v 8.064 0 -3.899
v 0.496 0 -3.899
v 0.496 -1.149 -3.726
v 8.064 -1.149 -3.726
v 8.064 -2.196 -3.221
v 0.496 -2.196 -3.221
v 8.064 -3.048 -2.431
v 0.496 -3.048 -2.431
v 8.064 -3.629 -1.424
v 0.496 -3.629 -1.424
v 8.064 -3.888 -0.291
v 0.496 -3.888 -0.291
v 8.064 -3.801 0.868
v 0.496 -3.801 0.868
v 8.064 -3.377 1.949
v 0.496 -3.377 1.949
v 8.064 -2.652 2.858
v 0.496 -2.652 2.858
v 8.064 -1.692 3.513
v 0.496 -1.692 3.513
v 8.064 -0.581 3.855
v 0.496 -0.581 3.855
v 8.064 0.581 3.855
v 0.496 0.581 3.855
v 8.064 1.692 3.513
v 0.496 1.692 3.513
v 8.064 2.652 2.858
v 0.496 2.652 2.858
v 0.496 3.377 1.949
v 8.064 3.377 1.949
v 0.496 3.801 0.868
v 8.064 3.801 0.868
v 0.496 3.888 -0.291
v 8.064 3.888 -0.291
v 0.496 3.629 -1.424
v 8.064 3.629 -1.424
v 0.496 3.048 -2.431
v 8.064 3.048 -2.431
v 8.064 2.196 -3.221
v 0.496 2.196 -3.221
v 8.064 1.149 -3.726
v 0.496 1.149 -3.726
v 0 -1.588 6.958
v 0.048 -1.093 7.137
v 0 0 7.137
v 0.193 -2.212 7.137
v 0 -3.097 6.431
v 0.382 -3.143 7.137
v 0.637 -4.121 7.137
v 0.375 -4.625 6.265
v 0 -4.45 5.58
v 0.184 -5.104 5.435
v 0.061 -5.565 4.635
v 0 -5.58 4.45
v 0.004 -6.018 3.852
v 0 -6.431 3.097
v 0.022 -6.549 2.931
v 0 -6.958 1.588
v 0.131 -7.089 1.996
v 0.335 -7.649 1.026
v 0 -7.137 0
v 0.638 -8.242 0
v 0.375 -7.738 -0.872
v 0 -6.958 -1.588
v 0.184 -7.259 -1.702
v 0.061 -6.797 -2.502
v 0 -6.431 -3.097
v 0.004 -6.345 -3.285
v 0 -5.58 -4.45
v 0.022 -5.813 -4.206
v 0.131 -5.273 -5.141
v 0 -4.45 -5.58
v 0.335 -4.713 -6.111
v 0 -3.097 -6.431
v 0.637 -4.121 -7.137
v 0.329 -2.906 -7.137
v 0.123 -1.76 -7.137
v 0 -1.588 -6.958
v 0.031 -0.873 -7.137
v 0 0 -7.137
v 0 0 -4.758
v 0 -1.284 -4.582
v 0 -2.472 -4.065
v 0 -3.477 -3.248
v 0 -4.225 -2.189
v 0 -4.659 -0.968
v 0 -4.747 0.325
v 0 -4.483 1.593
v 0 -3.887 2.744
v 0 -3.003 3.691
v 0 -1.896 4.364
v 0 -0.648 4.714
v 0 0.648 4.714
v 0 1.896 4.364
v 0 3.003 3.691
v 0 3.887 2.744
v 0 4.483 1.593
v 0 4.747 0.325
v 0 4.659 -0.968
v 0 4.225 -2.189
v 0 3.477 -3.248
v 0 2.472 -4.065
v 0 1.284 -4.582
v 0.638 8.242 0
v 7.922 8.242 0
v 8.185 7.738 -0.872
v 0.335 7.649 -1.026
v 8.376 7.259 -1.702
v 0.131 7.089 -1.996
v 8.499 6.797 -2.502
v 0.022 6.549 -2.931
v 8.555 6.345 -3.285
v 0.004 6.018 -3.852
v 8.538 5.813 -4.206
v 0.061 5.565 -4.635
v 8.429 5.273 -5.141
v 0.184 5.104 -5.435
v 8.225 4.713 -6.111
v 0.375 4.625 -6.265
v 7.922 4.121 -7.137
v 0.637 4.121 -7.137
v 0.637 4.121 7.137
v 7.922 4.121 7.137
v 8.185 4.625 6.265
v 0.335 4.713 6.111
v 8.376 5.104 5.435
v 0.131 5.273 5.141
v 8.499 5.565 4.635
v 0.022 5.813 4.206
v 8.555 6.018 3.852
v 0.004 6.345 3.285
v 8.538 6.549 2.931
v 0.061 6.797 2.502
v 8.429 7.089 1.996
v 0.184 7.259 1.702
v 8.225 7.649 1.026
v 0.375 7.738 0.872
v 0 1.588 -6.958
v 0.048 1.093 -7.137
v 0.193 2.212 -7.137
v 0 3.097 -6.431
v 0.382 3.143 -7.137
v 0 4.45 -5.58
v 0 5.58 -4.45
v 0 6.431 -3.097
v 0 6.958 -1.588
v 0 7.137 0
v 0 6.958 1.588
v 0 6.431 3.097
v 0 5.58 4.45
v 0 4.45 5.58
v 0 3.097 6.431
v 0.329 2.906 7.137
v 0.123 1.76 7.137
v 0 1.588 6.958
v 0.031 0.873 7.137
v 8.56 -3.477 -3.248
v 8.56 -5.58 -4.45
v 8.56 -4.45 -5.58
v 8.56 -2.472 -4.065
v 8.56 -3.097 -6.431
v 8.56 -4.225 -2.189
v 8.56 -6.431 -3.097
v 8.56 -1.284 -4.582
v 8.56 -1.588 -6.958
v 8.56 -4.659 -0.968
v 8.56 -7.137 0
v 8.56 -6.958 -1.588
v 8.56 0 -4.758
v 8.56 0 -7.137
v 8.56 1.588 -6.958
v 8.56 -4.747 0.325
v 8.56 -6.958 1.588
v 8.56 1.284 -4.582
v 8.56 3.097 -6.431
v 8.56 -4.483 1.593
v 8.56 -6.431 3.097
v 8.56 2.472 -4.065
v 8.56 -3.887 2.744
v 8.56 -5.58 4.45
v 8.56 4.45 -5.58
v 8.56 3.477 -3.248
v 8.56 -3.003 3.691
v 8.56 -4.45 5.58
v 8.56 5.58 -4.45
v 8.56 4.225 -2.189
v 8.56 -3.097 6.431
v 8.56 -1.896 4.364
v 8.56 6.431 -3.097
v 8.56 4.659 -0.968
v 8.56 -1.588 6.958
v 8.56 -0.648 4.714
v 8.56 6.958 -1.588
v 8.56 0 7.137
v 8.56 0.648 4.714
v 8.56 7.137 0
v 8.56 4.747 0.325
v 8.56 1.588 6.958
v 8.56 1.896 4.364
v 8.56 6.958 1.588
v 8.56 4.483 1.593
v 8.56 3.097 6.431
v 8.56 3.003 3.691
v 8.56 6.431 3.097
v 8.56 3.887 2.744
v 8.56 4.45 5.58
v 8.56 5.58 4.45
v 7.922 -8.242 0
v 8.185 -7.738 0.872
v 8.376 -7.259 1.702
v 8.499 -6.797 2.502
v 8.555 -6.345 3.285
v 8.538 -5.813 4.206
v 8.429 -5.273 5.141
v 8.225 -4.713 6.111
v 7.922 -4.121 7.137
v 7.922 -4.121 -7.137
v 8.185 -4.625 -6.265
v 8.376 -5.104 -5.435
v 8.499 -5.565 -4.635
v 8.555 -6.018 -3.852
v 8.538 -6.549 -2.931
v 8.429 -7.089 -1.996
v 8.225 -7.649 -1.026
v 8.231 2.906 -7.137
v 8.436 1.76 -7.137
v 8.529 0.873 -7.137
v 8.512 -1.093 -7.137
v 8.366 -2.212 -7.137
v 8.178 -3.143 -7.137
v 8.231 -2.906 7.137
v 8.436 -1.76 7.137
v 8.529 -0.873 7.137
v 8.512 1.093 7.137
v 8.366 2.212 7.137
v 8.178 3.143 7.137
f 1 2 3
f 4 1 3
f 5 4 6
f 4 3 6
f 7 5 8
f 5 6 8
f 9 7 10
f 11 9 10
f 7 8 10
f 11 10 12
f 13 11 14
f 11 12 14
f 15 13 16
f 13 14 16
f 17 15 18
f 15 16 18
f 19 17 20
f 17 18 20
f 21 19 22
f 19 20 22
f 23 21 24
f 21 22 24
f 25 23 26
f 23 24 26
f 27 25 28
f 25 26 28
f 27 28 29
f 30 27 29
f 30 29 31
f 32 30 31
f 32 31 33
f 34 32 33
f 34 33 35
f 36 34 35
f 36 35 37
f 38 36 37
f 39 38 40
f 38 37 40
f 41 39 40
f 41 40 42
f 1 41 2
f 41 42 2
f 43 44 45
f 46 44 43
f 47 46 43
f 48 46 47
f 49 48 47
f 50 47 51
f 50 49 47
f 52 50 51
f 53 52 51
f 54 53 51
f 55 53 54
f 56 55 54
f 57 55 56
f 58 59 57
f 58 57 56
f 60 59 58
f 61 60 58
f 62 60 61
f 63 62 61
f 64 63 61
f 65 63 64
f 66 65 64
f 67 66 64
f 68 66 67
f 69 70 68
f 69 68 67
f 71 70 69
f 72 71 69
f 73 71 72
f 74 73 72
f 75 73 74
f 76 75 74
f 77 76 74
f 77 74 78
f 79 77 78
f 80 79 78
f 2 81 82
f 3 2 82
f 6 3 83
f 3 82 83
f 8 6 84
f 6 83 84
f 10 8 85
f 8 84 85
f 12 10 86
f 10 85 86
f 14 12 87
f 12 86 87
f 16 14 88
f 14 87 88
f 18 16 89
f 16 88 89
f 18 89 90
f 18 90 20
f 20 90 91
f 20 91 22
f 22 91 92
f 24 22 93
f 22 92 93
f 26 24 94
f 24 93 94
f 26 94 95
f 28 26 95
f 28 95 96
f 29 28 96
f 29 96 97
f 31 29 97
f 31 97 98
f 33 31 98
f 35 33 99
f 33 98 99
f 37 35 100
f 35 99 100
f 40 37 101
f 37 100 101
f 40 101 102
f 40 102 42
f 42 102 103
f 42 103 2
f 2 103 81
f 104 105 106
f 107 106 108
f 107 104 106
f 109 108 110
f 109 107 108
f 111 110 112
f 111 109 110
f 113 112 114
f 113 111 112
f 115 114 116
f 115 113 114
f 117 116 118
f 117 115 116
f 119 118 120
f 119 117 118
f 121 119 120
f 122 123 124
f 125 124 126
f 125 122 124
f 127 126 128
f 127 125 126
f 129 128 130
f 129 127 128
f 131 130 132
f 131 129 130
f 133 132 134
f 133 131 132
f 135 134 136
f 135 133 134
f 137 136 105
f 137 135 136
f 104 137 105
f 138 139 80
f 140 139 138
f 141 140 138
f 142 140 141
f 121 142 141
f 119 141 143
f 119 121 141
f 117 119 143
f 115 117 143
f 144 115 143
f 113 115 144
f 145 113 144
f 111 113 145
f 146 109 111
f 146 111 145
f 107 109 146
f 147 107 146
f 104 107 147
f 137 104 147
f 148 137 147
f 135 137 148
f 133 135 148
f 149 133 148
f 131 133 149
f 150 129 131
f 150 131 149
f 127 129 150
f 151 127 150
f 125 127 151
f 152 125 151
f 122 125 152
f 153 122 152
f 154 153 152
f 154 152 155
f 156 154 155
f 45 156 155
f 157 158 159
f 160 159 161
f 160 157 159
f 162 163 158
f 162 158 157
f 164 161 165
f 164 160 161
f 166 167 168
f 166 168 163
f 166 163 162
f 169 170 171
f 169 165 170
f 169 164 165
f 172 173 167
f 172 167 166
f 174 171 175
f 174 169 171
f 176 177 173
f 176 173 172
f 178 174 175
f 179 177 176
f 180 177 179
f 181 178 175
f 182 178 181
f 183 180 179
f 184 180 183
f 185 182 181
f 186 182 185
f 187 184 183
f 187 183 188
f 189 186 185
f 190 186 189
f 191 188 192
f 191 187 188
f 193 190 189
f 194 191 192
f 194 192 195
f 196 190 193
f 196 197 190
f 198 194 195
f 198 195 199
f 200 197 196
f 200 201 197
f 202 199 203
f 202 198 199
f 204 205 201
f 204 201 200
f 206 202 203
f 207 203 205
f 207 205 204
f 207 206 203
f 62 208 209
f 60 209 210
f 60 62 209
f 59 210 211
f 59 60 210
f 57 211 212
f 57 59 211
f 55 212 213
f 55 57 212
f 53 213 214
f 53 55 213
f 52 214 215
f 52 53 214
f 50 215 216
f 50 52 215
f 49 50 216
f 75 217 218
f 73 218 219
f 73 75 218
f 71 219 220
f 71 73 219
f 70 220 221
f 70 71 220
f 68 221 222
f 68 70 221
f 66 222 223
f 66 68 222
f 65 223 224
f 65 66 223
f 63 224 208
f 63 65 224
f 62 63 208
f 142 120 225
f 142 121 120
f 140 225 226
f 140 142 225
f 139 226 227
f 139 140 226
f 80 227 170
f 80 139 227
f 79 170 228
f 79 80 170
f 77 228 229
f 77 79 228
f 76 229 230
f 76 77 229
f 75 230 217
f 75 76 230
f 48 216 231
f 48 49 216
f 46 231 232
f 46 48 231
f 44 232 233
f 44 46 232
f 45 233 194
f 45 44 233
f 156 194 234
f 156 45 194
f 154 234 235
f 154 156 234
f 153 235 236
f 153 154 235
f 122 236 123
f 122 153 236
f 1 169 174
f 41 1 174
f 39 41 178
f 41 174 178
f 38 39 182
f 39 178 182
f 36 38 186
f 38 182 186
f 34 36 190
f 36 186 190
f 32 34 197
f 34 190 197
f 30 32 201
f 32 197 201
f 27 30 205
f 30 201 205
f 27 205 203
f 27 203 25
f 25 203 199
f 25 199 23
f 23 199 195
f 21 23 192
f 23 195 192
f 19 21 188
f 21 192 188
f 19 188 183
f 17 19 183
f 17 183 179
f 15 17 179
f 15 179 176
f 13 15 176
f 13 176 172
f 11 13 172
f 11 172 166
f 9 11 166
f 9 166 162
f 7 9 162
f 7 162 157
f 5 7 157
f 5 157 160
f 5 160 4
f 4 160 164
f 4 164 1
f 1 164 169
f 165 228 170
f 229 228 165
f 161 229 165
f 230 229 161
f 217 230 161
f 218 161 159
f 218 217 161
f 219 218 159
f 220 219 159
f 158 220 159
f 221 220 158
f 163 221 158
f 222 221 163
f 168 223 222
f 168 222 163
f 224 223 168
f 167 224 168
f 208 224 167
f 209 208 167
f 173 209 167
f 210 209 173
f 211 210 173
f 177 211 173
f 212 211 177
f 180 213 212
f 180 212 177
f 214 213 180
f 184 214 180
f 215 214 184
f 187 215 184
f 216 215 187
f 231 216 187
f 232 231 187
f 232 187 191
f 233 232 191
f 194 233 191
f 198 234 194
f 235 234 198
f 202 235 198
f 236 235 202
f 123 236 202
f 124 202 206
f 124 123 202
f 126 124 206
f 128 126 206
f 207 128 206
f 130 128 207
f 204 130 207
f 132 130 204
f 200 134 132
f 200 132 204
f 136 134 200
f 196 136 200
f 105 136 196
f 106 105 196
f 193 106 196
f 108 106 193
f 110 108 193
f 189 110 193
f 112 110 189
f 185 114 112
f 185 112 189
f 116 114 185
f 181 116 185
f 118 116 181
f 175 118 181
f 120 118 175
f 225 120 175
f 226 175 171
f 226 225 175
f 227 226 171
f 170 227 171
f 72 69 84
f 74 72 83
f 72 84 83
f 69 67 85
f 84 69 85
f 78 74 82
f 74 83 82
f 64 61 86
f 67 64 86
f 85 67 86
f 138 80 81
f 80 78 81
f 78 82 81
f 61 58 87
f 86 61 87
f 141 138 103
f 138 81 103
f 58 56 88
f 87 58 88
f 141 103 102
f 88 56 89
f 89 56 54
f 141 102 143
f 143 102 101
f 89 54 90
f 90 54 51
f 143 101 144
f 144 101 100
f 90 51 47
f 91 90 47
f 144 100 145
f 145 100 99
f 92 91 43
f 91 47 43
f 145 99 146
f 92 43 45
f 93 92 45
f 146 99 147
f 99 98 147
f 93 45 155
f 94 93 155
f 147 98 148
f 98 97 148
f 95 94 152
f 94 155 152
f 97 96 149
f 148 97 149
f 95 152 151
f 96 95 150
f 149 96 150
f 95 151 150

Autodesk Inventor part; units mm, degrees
ref_plane "YZ Plane" through (0, 0, 0) normal (1, 0, 0) x (0, 1, 0)
ref_plane "XZ Plane" through (0, 0, 0) normal (0, 1, 0) x (-1, 0, 0)
sketch "Sketch1" plane through (0, 0, 0) normal (1, 0, 0) x (0, 1, 0)
  line L0 (-8.2416, 0) -> (-4.1208, 7.1374)
  line L1 (-4.1208, 7.1374) -> (4.1208, 7.1374)
  line L2 (4.1208, 7.1374) -> (8.2416, 0)
  line L3 (8.2416, 0) -> (4.1208, -7.1374)
  line L4 (4.1208, -7.1374) -> (-4.1208, -7.1374)
  line L5 (-4.1208, -7.1374) -> (-8.2416, 0)
  point P0 (0, 0)
  point P1 (0, 0)
  dimension "d0" = 16.4831
extrude "Body" add sketch "Sketch1" along normal blind 8.5598
sketch "Sketch2" plane through (0, 0, 0) normal (0, 0, 1) x (1, 0, 0)
  line L0 (0, 4.1208) -> (0, 8.2416) projected
  line L1 (0, 8.2416) -> (8.5598, 8.2416) projected
  line L2 (8.5598, 4.1208) -> (8.5598, 8.2416) projected
  line L3 (-1.712, 0) -> (10.2718, 0) projected
  line L4 (0.6375, 8.2416) -> (0, 7.1374)
  line L5 (7.9223, 8.2416) -> (8.5598, 7.1374)
  dimension "d3" = 30
  dimension "d4" = 30
  dimension "d5" = 14.2748
  dimension "d6" = 14.2748
revolve "Chamfer1" cut sketch "Sketch2" angle 360 about axis through (-10, 0, 0) along (1, 0, 0)
sketch "Sketch3" plane through (8.5598, 0, 0) normal (1, 0, 0) x (0, 0, -1)
  arc A0 (-3.5687, -6.1812) -> (3.5687, -6.1812) centre (0, 0) ccw projected
hole "Thread" at (8.5598, 0, 0) direction (-1, 0, 0) diameter 7.7978 end through all thread size "3/8-16 UNC" class "2B" standard "ANSI Unified Screw Threads"
chamfer "Chamfer2" distance 0.8593 angle 30 1 edges at (8.5598, 0, 3.8989) measured on face at (8.5598, 6.0224, 0.1567)
chamfer "Chamfer3" distance 0.8593 angle 30 1 edges at (0, 0, 3.8989) measured on face at (0, 6.0224, 0.1567)
ref_plane "Work Plane1" through (-14.8653, 0, 0) normal (0, -0.866, -0.5) x (1, 0, 0)
equation "\"d0\" = 1.1547 * SW"
equation "\"d1\" = KOH"
equation "\"d3\" = ANG1"
equation "\"d4\" = ANG2"
equation "\"d5\" = SW0"
equation "\"d6\" = SW01"
equation "\"d8\" = -0.5 * GD1 + 0.5 * NND"
equation "\"d40\" = -0.5 * GD1 + 0.5 * NND"
equation "\"d10\" = -0.5 * GD1 + 0.5 * NND"
equation "\"d41\" = -0.5 * GD1 + 0.5 * NND"
equation "\"ANG1\" = 30deg"
equation "\"ANG2\" = 30deg"
equation "\"NND\" = 9.525"
equation "\"KOH\" = 8.5598"
equation "\"SW\" = 14.2748"
equation "\"SW0\" = SW"
equation "\"SW01\" = SW"
equation "\"THREADDIA\" = 9.525"
equation "\"TOA\" = 30deg"
equation "\"E0\" = 1.155 * SW"
equation "\"GD1\" = 7.806481"
properties part number "AS 2465 - 3/8  UNC" material "Steel, Mild"
